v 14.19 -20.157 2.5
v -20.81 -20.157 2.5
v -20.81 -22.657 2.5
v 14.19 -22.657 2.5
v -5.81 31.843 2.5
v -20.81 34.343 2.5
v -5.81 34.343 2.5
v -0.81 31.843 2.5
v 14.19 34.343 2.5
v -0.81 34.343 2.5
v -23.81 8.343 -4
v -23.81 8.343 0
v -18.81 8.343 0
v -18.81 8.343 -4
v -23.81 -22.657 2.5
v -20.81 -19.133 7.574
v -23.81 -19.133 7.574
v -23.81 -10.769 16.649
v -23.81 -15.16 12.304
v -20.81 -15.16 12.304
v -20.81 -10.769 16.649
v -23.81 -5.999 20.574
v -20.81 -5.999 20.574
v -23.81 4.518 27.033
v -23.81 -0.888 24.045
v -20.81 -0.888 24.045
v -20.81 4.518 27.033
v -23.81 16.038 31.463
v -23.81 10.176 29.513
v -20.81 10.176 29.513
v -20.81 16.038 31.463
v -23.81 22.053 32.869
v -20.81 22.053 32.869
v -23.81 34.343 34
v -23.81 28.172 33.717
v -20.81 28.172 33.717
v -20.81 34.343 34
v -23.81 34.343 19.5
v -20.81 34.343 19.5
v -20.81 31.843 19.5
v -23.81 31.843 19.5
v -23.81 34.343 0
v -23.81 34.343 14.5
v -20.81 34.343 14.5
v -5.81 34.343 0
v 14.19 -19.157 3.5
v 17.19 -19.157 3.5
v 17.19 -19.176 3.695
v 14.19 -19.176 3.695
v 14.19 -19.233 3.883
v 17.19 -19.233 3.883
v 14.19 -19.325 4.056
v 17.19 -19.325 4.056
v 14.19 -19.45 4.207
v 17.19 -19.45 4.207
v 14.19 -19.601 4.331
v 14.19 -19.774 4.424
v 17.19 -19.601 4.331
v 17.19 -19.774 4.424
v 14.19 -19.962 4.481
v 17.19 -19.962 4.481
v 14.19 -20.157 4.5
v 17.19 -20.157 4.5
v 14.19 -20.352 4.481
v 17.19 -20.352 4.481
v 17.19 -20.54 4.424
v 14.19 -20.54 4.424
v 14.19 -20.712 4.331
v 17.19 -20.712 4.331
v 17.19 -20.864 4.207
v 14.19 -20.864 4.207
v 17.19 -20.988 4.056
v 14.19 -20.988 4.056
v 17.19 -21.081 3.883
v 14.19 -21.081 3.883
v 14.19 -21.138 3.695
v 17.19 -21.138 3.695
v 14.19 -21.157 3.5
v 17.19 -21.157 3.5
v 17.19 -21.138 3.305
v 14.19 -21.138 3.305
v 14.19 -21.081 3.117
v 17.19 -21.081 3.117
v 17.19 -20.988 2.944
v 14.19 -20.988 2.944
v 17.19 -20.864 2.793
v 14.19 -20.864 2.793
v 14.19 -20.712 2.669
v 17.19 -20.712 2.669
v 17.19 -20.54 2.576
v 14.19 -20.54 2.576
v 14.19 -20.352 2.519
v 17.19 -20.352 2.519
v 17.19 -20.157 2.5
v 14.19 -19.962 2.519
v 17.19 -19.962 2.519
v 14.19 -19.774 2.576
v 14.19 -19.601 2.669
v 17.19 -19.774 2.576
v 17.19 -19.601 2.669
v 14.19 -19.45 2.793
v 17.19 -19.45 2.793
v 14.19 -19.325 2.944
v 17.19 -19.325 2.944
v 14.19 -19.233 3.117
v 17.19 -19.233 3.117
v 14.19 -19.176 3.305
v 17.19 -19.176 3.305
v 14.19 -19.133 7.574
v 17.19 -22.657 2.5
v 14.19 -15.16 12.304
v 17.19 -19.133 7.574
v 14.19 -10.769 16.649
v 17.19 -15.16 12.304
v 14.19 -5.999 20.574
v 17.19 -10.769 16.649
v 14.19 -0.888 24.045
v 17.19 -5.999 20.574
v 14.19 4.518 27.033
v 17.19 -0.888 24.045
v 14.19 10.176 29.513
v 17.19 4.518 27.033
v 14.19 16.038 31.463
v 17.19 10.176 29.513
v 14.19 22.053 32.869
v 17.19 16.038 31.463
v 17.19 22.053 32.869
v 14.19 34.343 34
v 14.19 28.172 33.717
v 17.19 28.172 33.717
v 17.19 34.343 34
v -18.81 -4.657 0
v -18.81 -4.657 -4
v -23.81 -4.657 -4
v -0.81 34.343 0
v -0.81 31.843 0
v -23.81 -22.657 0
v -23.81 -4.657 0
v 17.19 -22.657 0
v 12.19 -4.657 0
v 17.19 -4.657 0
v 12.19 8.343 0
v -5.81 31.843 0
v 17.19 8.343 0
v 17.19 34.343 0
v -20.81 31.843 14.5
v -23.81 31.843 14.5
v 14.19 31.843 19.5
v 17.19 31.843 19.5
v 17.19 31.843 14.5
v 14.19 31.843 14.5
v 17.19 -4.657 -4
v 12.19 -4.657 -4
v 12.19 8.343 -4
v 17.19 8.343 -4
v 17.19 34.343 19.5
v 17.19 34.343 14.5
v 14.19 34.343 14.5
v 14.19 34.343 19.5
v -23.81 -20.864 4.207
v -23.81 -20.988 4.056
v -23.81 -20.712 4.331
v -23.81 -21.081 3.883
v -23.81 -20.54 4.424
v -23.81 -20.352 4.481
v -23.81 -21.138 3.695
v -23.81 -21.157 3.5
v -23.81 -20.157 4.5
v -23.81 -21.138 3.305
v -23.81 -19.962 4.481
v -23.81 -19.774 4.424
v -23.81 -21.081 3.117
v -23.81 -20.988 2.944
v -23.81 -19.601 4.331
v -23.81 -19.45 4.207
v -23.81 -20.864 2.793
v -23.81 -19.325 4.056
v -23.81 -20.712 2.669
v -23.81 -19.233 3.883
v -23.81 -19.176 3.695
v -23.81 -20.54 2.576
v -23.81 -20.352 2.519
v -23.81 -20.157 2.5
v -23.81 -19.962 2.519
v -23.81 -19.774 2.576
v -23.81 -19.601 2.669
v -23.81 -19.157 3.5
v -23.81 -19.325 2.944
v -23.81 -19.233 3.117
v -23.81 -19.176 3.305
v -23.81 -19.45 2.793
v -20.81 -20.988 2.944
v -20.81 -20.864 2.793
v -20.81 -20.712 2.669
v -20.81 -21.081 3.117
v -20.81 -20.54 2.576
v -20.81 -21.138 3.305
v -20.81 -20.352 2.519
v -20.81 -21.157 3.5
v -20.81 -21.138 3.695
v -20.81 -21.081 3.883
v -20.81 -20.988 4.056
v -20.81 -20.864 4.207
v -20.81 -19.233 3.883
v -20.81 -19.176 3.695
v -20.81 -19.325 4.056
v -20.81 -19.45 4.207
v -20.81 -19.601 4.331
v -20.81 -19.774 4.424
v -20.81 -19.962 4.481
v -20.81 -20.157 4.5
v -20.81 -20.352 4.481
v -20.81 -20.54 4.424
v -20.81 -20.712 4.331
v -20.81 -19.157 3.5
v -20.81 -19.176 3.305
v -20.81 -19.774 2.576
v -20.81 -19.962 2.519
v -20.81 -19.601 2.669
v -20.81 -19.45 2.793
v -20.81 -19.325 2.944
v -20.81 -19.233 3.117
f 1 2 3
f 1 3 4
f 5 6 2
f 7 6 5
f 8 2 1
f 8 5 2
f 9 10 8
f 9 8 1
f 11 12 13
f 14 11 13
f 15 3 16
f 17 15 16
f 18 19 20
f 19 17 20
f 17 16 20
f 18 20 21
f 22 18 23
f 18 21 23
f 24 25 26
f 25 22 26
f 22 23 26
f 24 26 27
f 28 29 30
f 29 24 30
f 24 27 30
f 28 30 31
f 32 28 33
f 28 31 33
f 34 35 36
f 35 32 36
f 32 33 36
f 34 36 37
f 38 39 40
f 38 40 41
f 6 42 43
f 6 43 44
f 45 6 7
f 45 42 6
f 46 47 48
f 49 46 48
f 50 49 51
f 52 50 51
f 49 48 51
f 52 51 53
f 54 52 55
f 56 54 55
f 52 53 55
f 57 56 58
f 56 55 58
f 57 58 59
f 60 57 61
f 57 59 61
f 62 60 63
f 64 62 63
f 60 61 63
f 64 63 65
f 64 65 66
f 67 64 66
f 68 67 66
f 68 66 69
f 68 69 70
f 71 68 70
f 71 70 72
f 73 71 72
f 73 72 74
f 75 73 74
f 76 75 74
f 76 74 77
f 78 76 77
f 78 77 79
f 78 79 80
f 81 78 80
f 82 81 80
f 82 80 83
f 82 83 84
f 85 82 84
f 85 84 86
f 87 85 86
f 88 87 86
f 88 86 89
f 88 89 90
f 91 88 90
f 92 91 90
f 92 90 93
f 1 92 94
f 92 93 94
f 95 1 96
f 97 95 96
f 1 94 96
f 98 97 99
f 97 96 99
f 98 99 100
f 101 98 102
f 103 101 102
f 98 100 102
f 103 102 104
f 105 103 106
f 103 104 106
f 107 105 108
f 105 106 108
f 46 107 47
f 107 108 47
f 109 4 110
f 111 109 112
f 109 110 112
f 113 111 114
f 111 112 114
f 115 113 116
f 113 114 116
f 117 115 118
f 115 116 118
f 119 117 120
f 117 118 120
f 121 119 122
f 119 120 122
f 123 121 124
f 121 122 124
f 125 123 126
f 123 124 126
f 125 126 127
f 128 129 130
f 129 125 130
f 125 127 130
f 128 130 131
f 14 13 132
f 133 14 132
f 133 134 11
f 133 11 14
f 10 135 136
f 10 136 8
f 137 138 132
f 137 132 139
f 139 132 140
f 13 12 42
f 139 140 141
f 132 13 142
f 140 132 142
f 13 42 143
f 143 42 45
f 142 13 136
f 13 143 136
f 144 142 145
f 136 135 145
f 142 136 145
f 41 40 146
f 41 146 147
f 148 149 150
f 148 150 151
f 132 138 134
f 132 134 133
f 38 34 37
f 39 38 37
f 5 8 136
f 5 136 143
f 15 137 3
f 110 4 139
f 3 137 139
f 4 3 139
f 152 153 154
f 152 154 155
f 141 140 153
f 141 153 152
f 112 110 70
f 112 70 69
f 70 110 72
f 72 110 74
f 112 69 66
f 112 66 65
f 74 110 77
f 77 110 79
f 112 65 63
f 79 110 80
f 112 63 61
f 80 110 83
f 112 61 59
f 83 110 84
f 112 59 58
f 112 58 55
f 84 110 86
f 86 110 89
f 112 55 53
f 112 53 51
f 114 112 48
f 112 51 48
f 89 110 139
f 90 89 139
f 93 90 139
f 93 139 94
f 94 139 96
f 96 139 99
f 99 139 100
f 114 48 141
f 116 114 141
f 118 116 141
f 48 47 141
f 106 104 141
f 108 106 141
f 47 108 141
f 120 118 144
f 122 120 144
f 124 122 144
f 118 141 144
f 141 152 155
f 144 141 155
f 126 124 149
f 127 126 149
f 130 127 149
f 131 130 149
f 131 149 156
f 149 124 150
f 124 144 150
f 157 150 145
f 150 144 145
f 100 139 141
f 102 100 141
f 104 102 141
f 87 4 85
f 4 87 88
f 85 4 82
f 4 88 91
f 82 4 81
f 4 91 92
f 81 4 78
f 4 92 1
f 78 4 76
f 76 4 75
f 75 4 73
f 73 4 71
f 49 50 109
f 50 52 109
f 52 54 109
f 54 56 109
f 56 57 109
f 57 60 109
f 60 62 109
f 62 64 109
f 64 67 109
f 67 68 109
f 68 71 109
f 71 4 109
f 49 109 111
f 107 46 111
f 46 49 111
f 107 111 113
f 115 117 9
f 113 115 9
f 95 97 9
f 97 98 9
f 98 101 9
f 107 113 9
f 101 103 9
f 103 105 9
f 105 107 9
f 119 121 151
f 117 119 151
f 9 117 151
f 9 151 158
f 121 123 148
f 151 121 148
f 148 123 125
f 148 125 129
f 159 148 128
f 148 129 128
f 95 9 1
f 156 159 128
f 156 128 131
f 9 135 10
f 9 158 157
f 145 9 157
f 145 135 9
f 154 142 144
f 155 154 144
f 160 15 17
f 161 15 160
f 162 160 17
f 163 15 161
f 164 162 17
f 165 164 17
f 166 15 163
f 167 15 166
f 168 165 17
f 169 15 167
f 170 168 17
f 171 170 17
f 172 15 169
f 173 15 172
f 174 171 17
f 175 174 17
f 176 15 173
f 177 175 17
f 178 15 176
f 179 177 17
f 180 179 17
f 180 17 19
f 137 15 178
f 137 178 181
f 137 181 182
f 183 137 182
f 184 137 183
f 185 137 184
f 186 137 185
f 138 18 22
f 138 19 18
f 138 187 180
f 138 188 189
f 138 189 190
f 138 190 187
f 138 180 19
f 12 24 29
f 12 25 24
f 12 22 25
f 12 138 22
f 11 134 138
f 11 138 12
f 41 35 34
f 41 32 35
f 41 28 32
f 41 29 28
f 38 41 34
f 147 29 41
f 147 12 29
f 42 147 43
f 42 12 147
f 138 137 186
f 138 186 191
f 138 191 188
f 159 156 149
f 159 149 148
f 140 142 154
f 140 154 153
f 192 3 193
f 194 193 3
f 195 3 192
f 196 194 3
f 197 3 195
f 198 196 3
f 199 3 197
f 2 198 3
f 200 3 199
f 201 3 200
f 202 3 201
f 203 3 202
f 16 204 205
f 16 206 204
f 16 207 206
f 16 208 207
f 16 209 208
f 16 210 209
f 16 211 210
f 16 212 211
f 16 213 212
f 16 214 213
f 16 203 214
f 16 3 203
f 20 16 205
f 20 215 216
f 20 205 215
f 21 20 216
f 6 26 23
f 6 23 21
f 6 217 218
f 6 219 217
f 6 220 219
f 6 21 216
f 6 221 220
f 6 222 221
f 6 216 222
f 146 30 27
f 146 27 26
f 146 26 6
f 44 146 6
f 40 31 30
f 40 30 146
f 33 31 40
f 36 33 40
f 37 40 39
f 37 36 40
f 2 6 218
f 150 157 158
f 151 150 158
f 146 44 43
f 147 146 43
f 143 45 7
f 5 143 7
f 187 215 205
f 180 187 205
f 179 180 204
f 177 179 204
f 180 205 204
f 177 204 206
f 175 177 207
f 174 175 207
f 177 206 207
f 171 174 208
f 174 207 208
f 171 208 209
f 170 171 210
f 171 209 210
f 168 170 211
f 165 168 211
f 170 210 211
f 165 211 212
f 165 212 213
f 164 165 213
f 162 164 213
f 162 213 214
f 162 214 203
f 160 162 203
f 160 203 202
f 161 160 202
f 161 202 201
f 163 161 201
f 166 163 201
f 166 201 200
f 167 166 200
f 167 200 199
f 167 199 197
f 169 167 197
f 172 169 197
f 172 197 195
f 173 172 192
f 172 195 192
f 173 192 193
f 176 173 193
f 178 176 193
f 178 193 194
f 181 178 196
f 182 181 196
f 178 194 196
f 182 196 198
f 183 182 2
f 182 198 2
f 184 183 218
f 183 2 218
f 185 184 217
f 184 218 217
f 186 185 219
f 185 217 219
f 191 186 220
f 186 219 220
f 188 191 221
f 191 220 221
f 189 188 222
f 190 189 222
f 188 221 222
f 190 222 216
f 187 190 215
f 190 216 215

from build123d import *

# Parameters (mm, degrees)
F0_W      = 41
F0_H      = 57
F1_DEPTH  = 34
F2_W      = 35
F2_H      = 57
F3_DEPTH  = 31.5
F5_DEPTH  = 41.001
F6_R      = 1
F7_DEPTH  = 41.001
F8_W      = 3
F8_H      = 5
F8_W_2    = 5
F8_H_2    = 2.5
F9_DEPTH  = 2.5
F10_W     = 5
F10_H     = 13
F11_DEPTH = 4


with BuildPart() as f1:
    # F0 (on Top) → F1 (new body)
    with BuildSketch(Plane.XY):
        with Locations((-3.310106, 5.843145)):
            Rectangle(F0_W, F0_H)
    extrude(amount=F1_DEPTH)

    # F2 (on face) → F3 (cut)
    with BuildSketch(Plane.XY.offset(34)):
        with Locations((-3.310106, 5.843145)):
            Rectangle(F2_W, F2_H)
    extrude(amount=-F3_DEPTH, mode=Mode.SUBTRACT)

    # F4 (on face) → F5 (cut, through all)
    with BuildSketch(Plane.YZ.offset(17.189894)):
        with BuildLine():
            ThreePointArc((-22.656855, 2.5), (1.780705, 25.601082), (34.343145, 34))
            Line((34.343145, 34), (-22.656855, 34))
            Line((-22.656855, 34), (-22.656855, 2.5))
        make_face()
    extrude(amount=-F5_DEPTH, mode=Mode.SUBTRACT)

    # F6 (on face) → F7 (cut, through all)
    with BuildSketch(Plane.YZ.offset(17.189894)):
        with Locations((-20.156855, 3.5)):
            Circle(F6_R)
    extrude(amount=-F7_DEPTH, mode=Mode.SUBTRACT)

    # F8 (on face) → F9 (cut)
    with BuildSketch(Plane(origin=(0, 34.343145, 0), x_dir=(-1, 0, 0), z_dir=(0, 1, 0))):
        with Locations((-15.689894, 17)):
            Rectangle(F8_W, F8_H)
        with Locations((3.310106, 1.25)):
            Rectangle(F8_W_2, F8_H_2)
        with Locations((22.310106, 17)):
            Rectangle(F8_W, F8_H)
    extrude(amount=-F9_DEPTH, mode=Mode.SUBTRACT)

    # F10 (on face) → F11 (join)
    with BuildSketch(Plane(origin=(0, 0, 0), x_dir=(1, 0, 0), z_dir=(0, 0, -1))):
        with Locations((14.689894, -1.843145)):
            Rectangle(F10_W, F10_H)
        with Locations((-21.310106, -1.843145)):
            Rectangle(F10_W, F10_H)
    extrude(amount=F11_DEPTH)


solid = f1.part
